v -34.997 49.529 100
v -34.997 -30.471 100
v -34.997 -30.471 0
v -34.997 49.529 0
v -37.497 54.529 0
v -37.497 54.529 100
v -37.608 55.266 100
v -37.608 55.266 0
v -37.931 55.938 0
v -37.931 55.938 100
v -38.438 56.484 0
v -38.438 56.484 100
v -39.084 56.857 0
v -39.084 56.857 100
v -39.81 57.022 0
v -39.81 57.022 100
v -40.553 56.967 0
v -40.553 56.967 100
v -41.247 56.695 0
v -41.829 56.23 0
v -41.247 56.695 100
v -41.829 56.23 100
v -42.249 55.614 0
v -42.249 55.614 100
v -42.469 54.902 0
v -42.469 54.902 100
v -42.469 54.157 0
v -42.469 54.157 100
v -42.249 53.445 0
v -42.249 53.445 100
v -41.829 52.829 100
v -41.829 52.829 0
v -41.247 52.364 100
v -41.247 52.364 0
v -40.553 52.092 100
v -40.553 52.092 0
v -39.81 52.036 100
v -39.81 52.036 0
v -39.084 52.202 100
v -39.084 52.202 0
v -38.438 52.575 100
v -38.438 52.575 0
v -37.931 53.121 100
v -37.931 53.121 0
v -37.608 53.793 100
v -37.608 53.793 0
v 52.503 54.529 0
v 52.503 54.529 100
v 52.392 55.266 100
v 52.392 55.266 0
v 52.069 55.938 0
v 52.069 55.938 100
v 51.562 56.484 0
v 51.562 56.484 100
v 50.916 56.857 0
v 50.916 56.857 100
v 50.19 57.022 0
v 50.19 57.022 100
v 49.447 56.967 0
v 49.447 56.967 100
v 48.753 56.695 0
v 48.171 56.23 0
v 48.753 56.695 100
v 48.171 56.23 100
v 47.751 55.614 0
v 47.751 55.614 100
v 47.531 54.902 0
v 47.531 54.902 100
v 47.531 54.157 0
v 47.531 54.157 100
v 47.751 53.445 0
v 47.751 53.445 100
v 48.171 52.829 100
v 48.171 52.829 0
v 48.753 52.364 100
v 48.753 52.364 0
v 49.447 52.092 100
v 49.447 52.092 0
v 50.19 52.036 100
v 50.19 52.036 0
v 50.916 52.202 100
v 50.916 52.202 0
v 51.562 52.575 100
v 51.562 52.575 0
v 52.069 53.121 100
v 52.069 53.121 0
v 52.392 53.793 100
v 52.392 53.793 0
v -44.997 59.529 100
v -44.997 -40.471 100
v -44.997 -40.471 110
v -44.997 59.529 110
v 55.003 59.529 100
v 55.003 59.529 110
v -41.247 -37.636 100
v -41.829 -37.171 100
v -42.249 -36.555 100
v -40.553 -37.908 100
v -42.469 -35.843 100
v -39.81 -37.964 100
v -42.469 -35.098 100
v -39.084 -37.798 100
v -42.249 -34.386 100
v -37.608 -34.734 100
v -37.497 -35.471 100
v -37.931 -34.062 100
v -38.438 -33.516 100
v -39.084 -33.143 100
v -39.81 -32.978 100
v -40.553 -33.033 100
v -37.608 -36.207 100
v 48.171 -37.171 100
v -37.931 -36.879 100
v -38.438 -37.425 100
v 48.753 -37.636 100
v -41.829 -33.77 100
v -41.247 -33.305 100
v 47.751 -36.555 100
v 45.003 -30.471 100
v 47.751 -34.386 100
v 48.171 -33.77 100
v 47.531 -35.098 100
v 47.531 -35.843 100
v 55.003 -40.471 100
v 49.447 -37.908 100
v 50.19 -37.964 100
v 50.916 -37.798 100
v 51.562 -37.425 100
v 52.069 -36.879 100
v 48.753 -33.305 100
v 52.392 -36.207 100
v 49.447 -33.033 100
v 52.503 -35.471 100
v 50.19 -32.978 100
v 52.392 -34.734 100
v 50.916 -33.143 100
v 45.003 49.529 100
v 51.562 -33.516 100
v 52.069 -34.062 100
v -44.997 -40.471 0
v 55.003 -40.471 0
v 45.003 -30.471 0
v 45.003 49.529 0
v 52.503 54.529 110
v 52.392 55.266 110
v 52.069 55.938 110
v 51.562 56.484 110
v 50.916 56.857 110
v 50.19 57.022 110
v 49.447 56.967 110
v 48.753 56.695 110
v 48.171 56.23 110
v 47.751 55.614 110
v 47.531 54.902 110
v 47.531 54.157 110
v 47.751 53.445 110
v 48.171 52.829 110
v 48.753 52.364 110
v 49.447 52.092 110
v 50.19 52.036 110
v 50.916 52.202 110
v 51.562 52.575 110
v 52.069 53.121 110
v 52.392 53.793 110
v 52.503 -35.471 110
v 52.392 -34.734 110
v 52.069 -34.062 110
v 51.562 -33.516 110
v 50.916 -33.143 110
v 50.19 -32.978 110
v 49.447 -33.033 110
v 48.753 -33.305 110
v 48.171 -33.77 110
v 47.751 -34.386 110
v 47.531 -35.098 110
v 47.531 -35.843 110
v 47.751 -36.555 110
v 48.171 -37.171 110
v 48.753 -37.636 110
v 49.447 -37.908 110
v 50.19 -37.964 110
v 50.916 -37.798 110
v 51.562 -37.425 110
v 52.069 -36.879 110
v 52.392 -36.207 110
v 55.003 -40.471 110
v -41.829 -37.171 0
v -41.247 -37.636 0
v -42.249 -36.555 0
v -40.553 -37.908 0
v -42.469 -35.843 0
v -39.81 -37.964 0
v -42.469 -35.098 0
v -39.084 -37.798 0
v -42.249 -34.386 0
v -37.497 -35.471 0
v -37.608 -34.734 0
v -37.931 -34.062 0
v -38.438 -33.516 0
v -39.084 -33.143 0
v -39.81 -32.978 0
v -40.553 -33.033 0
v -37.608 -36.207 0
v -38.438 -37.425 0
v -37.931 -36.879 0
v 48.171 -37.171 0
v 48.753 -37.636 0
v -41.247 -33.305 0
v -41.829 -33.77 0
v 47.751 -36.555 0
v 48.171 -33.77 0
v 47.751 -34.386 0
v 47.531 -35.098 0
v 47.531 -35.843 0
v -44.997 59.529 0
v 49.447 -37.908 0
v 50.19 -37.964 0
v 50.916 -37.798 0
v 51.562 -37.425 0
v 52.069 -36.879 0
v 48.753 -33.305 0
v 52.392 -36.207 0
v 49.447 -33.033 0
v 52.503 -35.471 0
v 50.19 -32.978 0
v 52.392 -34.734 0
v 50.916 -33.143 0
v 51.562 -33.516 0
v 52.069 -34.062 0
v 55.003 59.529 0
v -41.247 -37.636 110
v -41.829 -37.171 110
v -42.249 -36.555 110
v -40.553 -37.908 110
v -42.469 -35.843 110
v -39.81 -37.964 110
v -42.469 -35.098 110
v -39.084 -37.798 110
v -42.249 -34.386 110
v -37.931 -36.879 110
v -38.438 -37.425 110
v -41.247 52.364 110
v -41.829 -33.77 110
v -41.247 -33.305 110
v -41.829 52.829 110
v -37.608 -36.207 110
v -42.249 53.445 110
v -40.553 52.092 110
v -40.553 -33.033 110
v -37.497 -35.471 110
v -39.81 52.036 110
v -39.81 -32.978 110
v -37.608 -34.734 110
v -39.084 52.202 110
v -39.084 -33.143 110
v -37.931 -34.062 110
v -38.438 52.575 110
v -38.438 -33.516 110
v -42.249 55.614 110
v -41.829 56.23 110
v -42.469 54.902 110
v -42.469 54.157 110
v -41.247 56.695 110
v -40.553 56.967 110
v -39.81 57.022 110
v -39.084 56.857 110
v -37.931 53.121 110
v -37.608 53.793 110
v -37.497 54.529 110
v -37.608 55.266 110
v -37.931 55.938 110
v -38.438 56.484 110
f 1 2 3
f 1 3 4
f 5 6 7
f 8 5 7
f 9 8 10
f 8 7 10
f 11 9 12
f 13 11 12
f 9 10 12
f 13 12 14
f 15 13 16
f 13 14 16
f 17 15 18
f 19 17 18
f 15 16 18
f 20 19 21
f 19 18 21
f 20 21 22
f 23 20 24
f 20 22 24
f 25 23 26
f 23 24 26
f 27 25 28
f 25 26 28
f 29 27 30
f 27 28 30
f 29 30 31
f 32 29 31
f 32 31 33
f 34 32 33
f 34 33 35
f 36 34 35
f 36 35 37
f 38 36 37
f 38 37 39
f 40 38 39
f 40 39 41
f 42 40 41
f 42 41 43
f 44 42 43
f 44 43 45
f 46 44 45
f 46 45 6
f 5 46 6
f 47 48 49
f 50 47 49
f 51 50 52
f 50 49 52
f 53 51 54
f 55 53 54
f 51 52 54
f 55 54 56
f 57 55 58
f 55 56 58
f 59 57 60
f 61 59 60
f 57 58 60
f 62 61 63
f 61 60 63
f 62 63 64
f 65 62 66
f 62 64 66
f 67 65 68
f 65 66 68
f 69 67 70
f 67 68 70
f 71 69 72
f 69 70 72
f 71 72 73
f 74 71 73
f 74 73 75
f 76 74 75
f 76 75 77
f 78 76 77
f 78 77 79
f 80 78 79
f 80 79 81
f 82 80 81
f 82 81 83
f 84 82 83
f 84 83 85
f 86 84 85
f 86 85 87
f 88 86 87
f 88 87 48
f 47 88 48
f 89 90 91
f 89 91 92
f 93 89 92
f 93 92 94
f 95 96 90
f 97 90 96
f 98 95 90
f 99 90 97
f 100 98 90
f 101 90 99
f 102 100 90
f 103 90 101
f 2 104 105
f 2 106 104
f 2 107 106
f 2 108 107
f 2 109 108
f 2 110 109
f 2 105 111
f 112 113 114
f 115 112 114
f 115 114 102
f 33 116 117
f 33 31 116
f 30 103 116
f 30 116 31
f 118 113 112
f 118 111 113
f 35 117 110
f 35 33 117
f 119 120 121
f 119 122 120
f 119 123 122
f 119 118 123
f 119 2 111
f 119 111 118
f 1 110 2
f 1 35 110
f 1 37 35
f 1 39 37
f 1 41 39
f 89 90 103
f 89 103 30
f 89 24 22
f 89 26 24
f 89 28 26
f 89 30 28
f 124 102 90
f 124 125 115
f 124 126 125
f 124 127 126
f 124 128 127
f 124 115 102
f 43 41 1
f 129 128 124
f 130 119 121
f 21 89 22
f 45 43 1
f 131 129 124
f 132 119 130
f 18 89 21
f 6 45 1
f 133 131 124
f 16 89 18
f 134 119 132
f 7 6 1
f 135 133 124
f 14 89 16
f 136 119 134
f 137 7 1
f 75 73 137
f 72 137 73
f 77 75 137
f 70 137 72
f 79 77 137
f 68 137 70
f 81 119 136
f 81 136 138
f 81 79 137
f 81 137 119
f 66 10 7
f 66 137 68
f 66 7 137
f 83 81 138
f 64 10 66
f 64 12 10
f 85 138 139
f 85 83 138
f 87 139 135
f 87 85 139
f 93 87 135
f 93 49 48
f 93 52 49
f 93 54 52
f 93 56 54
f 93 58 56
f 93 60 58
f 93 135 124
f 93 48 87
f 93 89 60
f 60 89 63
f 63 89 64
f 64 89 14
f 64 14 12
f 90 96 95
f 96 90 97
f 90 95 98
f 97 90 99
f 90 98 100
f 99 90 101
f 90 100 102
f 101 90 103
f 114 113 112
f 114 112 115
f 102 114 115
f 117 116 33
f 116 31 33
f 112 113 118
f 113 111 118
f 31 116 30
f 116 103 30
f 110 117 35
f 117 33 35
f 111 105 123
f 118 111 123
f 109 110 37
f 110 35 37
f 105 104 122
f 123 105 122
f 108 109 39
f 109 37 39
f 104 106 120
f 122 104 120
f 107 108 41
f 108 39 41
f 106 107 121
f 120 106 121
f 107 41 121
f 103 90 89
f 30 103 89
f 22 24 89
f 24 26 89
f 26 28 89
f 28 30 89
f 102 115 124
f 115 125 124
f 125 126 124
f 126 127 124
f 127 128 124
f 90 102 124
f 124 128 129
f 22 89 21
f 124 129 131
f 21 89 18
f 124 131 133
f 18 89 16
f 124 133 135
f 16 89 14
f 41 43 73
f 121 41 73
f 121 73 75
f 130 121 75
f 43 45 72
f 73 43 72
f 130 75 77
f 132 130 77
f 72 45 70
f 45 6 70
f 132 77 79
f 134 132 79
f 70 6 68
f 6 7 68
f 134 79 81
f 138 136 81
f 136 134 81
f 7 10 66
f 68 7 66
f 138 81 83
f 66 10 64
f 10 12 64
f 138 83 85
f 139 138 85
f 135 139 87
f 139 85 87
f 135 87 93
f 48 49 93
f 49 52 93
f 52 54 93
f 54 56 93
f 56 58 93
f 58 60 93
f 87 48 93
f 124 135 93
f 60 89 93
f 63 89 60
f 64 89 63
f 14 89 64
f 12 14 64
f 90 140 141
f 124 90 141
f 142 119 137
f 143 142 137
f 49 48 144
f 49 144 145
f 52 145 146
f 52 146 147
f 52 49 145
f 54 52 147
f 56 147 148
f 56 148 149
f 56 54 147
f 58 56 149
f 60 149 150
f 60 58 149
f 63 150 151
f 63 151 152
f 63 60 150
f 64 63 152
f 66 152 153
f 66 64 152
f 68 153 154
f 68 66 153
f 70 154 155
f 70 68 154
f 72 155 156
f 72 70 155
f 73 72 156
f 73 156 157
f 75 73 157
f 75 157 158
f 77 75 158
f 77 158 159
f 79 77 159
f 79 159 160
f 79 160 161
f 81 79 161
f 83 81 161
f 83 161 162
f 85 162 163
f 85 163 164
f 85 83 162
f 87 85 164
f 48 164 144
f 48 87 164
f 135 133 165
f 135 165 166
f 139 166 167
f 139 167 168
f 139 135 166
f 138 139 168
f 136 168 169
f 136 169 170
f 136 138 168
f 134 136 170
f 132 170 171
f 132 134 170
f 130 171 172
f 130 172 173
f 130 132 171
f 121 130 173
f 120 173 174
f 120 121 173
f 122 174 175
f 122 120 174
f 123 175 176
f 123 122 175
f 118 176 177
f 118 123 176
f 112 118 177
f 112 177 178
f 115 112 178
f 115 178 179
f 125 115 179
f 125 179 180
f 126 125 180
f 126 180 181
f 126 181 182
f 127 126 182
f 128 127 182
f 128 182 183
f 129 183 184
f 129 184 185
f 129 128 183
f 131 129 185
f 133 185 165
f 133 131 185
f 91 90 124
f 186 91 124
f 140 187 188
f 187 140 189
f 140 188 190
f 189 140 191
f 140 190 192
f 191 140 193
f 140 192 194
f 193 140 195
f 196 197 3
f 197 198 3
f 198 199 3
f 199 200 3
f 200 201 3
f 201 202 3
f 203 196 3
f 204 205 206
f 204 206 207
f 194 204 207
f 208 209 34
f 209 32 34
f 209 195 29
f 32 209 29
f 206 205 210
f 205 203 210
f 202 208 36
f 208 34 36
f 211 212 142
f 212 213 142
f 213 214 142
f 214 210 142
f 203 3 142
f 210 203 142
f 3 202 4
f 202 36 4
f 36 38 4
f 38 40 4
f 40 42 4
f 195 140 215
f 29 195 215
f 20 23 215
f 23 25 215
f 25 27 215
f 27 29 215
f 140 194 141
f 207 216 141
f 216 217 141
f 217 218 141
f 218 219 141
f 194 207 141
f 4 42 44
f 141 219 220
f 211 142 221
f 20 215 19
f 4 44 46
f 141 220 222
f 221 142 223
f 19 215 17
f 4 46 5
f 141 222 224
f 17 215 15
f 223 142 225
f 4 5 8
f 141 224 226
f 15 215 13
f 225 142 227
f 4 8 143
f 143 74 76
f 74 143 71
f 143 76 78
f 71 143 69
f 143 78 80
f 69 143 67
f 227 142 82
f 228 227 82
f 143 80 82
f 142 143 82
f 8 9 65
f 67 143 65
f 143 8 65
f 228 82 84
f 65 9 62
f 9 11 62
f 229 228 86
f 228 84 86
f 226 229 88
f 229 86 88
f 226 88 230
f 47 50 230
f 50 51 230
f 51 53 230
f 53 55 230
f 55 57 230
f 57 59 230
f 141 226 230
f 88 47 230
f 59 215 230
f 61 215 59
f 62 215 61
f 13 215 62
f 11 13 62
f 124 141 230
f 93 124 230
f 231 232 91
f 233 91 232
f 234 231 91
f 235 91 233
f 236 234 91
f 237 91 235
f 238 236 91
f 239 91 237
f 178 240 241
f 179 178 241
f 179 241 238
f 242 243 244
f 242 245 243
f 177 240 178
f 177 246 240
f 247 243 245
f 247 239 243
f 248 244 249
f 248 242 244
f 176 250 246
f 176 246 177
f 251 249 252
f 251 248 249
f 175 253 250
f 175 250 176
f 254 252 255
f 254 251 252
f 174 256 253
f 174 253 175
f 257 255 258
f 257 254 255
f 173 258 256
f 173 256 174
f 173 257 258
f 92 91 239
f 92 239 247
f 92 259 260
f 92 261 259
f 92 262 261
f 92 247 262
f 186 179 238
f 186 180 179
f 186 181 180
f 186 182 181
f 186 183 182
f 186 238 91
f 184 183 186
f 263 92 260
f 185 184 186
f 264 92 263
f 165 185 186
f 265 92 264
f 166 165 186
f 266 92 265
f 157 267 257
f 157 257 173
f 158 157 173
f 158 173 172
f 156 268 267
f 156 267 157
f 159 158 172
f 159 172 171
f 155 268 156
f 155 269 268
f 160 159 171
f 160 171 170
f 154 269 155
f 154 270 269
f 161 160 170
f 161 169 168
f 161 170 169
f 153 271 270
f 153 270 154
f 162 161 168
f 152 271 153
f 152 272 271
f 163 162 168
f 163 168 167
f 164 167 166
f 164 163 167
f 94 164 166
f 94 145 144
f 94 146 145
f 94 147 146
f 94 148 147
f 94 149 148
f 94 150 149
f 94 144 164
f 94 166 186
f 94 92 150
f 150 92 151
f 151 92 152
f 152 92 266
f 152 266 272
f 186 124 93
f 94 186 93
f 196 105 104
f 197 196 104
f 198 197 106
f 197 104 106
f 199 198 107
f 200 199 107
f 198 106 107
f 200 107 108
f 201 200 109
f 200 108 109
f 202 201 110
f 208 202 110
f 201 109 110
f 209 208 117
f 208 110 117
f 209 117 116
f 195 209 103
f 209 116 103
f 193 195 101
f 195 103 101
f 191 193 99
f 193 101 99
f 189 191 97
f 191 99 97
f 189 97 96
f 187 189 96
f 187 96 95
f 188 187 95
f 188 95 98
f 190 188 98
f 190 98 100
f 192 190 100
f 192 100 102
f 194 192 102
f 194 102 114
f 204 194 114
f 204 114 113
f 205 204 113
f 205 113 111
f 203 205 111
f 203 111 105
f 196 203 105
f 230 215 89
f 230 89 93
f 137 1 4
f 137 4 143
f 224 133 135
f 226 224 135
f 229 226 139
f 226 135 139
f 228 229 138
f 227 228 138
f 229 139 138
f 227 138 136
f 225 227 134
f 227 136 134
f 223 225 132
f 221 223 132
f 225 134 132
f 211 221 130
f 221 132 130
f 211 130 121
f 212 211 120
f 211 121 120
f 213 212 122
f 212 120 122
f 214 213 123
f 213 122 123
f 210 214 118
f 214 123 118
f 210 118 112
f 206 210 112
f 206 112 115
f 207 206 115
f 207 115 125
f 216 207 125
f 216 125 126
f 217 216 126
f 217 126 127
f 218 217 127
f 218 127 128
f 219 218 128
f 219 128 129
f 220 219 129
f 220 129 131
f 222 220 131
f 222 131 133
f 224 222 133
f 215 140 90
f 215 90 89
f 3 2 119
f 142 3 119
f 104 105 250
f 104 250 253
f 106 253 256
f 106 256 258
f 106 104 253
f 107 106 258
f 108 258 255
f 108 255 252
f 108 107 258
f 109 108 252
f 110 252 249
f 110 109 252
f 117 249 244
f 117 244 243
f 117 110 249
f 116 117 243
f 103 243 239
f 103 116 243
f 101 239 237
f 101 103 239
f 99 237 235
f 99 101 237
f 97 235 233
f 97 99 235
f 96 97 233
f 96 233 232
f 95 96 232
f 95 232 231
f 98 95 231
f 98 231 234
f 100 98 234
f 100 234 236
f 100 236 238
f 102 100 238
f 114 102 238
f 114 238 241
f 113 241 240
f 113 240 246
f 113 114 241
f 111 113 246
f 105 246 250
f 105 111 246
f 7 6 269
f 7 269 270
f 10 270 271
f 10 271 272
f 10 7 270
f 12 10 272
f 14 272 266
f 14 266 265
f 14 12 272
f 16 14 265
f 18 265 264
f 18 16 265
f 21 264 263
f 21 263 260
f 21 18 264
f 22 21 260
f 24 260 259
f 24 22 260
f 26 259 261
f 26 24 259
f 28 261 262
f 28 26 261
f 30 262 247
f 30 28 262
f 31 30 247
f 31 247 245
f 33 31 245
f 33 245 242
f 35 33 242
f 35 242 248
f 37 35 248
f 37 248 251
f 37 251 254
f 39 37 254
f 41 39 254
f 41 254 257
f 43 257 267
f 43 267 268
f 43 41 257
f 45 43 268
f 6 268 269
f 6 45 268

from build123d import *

# Parameters (mm, degrees)
F0_W     = 100
F0_H     = 100
F1_DEPTH = 100
F2_W     = 80
F2_H     = 80
F3_DEPTH = 100.001
F4_R     = 2.5
F5_DEPTH = 100.001
F6_W     = 100
F6_H     = 100
F6_R     = 2.5
F7_DEPTH = 10


with BuildPart() as f1:
    # F0 (on Top) → F1 (new body)
    with BuildSketch(Plane.XY):
        with Locations((5.003134, 9.529437)):
            Rectangle(F0_W, F0_H)
    extrude(amount=F1_DEPTH)

    # F2 (on face) → F3 (cut, through all)
    with BuildSketch(Plane.XY.offset(100)):
        with Locations((5.003134, 9.529437)):
            Rectangle(F2_W, F2_H)
    extrude(amount=-F3_DEPTH, mode=Mode.SUBTRACT)

    # F4 (on face) → F5 (cut, through all)
    with BuildSketch(Plane.XY.offset(100)):
        with Locations((-39.996866, 54.529437)):
            Circle(F4_R)
        with Locations((50.003134, 54.529437)):
            Circle(F4_R)
        with Locations((-39.996866, -35.470563)):
            Circle(F4_R)
        with Locations((50.003134, -35.470563)):
            Circle(F4_R)
    extrude(amount=-F5_DEPTH, mode=Mode.SUBTRACT)


with BuildPart() as f7:
    # F6 (on face) → F7 (new body)
    with BuildSketch(Plane.XY.offset(100)):
        with Locations((5.003134, 9.529437)):
            Rectangle(F6_W, F6_H)
        with Locations((-39.996866, -35.470563)):
            Circle(F6_R, mode=Mode.SUBTRACT)
        with Locations((50.003134, -35.470563)):
            Circle(F6_R, mode=Mode.SUBTRACT)
        with Locations((-39.996866, 54.529437)):
            Circle(F6_R, mode=Mode.SUBTRACT)
        with Locations((50.003134, 54.529437)):
            Circle(F6_R, mode=Mode.SUBTRACT)
    extrude(amount=F7_DEPTH)


solid = Compound([f1.part, f7.part])
